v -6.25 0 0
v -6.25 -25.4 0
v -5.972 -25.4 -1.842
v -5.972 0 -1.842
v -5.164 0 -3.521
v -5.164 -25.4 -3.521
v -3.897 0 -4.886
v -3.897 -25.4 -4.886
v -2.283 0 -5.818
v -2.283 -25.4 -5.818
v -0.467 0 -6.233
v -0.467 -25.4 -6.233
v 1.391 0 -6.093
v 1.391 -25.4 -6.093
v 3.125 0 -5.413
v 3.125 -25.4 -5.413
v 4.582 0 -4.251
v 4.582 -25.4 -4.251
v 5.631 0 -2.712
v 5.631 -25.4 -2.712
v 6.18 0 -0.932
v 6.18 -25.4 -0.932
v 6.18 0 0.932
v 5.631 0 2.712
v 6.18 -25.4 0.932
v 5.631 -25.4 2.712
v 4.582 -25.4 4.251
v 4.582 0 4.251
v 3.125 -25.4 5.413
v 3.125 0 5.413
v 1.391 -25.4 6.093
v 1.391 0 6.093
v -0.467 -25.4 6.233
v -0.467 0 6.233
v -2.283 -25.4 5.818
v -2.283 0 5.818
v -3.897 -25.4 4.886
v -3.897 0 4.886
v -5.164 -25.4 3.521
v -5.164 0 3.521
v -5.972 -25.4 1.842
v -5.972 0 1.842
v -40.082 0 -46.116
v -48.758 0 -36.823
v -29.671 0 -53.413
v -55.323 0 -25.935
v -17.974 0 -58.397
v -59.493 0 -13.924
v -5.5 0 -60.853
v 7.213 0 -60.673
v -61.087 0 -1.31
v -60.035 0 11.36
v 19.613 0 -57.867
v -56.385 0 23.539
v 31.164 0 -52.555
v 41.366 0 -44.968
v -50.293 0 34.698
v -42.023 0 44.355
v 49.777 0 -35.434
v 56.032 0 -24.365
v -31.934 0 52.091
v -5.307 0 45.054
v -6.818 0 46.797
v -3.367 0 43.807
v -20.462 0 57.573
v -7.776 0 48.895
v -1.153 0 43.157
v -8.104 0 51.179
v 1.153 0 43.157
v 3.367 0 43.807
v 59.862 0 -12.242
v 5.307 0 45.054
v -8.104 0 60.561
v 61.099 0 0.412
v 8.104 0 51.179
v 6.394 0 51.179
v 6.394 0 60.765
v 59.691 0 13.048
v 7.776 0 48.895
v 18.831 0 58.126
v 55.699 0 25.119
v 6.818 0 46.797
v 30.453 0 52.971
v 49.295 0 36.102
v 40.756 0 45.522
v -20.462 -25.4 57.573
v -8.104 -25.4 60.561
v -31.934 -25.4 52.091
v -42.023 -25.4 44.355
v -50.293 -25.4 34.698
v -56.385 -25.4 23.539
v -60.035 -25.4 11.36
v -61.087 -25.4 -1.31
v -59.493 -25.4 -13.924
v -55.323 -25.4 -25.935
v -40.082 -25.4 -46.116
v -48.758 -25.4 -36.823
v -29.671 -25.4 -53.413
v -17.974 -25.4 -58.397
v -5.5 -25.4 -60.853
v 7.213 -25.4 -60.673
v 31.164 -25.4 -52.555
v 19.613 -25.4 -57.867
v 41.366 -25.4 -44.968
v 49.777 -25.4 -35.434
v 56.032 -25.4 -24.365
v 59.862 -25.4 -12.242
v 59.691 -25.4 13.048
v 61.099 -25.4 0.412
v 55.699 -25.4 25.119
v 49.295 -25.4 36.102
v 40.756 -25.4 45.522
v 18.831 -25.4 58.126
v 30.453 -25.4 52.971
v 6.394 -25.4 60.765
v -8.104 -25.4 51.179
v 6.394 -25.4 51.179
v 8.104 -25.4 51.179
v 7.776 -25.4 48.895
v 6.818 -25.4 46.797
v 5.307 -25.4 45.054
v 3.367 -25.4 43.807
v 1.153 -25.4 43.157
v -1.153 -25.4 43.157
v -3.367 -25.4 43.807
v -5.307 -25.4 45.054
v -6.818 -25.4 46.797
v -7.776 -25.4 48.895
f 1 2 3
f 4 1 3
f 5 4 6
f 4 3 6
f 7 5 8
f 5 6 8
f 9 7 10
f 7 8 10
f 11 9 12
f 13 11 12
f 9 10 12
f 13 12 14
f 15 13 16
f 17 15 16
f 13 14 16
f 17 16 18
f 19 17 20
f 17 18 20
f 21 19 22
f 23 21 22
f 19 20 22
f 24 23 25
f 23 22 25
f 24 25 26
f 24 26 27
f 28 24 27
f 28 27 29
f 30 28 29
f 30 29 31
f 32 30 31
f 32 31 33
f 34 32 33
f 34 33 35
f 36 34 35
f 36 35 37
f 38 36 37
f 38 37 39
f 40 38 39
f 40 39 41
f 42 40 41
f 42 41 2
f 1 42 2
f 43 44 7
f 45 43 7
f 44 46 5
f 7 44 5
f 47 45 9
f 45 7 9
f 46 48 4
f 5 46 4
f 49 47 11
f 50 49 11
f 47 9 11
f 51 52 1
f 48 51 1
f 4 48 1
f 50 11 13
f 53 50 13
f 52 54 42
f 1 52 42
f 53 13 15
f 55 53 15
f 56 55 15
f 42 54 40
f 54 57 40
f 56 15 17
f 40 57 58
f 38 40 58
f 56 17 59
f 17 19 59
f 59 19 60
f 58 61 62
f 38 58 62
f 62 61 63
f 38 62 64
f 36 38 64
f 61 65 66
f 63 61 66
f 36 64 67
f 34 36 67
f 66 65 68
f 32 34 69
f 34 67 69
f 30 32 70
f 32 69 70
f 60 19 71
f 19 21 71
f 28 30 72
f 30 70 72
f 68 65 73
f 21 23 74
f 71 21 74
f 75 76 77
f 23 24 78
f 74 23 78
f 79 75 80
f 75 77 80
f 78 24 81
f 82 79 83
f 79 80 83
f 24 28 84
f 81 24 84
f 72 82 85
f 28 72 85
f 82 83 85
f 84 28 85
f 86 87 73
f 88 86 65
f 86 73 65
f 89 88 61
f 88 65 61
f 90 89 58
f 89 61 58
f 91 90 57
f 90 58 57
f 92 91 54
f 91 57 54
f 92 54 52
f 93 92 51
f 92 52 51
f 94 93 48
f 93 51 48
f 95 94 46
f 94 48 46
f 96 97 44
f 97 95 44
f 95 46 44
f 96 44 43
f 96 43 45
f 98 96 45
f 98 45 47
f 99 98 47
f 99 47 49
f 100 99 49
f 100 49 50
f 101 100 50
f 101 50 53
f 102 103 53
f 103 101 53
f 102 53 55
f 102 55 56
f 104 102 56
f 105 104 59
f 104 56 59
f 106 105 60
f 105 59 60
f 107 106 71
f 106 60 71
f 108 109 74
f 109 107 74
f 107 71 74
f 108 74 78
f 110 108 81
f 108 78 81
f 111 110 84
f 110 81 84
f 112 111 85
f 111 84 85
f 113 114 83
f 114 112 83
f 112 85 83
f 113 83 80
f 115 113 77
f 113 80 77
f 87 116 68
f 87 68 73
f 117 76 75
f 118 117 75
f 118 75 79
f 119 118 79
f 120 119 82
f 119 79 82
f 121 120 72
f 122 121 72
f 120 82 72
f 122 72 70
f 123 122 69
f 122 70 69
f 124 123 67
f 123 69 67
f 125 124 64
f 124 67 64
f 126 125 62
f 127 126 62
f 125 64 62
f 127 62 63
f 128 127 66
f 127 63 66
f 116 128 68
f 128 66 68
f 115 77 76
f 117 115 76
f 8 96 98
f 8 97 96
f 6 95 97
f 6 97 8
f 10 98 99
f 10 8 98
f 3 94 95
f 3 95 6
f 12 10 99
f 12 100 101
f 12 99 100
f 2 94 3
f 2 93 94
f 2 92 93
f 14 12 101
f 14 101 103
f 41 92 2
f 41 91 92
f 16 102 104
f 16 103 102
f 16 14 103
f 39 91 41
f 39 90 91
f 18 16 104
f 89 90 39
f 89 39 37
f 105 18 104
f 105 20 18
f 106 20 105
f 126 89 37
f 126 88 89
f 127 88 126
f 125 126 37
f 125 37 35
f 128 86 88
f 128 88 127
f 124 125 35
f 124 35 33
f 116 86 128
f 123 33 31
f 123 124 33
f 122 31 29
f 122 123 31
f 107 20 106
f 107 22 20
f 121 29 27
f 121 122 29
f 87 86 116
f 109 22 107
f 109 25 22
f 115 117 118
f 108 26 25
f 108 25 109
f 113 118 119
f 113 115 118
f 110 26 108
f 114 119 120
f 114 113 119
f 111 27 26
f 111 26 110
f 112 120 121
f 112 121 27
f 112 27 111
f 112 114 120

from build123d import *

# Parameters (mm, degrees)
F0_R     = 61.10067
F1_DEPTH = 25.4
F3_D     = 12.5
F5_DEPTH = 25.4


with BuildPart() as f1:
    # F0 (on Front) → F1 (new body)
    with BuildSketch(Plane.XZ):
        Circle(F0_R)
    extrude(amount=F1_DEPTH)

    # F3 (through all)
    with Locations(Plane(origin=(0, 0, 0), x_dir=(1, 0, 0), z_dir=(0, 1, 0))):
        with Locations((0, 0)):
            Hole(F3_D / 2)

    # F4 (on face) → F5 (cut)
    with BuildSketch(Plane(origin=(0, 0, 0), x_dir=(-1, 0, 0), z_dir=(0, 1, 0))):
        with BuildLine():
            Line((-6.393978, 51.178693), (-8.104244, 51.178693))
            ThreePointArc((-8.104244, 51.178693), (0, 43.07445), (8.104244, 51.178693))
            Line((8.104244, 51.178693), (8.104244, 60.765195))
            ThreePointArc((8.104244, 60.765195), (0.855133, 68.014306), (-6.393978, 60.765195))
            Line((-6.393978, 60.765195), (-6.393978, 51.178693))
        make_face()
    extrude(amount=-F5_DEPTH, mode=Mode.SUBTRACT)


solid = f1.part
